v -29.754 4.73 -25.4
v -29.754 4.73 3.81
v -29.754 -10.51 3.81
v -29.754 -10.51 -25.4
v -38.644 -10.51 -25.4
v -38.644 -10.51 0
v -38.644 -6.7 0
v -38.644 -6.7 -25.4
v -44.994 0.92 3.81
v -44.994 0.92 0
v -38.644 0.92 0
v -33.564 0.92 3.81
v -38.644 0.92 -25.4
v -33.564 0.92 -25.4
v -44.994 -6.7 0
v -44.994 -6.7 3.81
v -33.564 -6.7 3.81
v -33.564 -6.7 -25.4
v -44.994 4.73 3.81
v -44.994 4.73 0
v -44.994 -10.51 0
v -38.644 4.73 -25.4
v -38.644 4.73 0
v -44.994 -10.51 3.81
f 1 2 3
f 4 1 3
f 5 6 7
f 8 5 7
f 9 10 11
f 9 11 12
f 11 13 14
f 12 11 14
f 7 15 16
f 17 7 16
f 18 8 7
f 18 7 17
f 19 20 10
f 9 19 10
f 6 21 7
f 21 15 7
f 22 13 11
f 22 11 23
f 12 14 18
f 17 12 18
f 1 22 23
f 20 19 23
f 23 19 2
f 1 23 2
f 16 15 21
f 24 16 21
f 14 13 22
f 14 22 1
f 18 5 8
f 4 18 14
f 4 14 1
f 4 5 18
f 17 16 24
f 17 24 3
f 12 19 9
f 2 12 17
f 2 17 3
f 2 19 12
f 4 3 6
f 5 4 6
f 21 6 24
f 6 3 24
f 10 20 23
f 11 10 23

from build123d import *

# Parameters (mm, degrees)
F1_DEPTH = 3.81
F3_DEPTH = 25.4
F4_W     = 5.08
F4_H     = 7.62
F5_DEPTH = 50.8


with BuildPart() as f1:
    # F0 (on Top) → F1 (new body)
    with BuildSketch(Plane.XY):
        Polygon((-29.753983, 4.73037), (-44.993983, 4.73037), (-44.993983, 0.92037), (-38.643983, 0.92037), (-38.643983, -6.69963), (-44.993983, -6.69963), (-44.993983, -10.50963), (-29.753983, -10.50963), align=None)
    extrude(amount=F1_DEPTH)

    # F2 (on face) → F3 (join)
    with BuildSketch(Plane(origin=(0, 0, 0), x_dir=(1, 0, 0), z_dir=(0, 0, -1))):
        Polygon((-29.753983, 10.50963), (-38.643983, 10.50963), (-38.643983, 6.69963), (-38.643983, -0.92037), (-38.643983, -4.73037), (-29.753983, -4.73037), align=None)
    extrude(amount=F3_DEPTH)

    # F4 (on face) → F5 (cut)
    with BuildSketch(Plane(origin=(0, 0, -25.4), x_dir=(1, 0, 0), z_dir=(0, 0, -1))):
        with Locations((-36.103983, 2.88963)):
            Rectangle(F4_W, F4_H)
    extrude(amount=-F5_DEPTH, mode=Mode.SUBTRACT)


solid = f1.part
